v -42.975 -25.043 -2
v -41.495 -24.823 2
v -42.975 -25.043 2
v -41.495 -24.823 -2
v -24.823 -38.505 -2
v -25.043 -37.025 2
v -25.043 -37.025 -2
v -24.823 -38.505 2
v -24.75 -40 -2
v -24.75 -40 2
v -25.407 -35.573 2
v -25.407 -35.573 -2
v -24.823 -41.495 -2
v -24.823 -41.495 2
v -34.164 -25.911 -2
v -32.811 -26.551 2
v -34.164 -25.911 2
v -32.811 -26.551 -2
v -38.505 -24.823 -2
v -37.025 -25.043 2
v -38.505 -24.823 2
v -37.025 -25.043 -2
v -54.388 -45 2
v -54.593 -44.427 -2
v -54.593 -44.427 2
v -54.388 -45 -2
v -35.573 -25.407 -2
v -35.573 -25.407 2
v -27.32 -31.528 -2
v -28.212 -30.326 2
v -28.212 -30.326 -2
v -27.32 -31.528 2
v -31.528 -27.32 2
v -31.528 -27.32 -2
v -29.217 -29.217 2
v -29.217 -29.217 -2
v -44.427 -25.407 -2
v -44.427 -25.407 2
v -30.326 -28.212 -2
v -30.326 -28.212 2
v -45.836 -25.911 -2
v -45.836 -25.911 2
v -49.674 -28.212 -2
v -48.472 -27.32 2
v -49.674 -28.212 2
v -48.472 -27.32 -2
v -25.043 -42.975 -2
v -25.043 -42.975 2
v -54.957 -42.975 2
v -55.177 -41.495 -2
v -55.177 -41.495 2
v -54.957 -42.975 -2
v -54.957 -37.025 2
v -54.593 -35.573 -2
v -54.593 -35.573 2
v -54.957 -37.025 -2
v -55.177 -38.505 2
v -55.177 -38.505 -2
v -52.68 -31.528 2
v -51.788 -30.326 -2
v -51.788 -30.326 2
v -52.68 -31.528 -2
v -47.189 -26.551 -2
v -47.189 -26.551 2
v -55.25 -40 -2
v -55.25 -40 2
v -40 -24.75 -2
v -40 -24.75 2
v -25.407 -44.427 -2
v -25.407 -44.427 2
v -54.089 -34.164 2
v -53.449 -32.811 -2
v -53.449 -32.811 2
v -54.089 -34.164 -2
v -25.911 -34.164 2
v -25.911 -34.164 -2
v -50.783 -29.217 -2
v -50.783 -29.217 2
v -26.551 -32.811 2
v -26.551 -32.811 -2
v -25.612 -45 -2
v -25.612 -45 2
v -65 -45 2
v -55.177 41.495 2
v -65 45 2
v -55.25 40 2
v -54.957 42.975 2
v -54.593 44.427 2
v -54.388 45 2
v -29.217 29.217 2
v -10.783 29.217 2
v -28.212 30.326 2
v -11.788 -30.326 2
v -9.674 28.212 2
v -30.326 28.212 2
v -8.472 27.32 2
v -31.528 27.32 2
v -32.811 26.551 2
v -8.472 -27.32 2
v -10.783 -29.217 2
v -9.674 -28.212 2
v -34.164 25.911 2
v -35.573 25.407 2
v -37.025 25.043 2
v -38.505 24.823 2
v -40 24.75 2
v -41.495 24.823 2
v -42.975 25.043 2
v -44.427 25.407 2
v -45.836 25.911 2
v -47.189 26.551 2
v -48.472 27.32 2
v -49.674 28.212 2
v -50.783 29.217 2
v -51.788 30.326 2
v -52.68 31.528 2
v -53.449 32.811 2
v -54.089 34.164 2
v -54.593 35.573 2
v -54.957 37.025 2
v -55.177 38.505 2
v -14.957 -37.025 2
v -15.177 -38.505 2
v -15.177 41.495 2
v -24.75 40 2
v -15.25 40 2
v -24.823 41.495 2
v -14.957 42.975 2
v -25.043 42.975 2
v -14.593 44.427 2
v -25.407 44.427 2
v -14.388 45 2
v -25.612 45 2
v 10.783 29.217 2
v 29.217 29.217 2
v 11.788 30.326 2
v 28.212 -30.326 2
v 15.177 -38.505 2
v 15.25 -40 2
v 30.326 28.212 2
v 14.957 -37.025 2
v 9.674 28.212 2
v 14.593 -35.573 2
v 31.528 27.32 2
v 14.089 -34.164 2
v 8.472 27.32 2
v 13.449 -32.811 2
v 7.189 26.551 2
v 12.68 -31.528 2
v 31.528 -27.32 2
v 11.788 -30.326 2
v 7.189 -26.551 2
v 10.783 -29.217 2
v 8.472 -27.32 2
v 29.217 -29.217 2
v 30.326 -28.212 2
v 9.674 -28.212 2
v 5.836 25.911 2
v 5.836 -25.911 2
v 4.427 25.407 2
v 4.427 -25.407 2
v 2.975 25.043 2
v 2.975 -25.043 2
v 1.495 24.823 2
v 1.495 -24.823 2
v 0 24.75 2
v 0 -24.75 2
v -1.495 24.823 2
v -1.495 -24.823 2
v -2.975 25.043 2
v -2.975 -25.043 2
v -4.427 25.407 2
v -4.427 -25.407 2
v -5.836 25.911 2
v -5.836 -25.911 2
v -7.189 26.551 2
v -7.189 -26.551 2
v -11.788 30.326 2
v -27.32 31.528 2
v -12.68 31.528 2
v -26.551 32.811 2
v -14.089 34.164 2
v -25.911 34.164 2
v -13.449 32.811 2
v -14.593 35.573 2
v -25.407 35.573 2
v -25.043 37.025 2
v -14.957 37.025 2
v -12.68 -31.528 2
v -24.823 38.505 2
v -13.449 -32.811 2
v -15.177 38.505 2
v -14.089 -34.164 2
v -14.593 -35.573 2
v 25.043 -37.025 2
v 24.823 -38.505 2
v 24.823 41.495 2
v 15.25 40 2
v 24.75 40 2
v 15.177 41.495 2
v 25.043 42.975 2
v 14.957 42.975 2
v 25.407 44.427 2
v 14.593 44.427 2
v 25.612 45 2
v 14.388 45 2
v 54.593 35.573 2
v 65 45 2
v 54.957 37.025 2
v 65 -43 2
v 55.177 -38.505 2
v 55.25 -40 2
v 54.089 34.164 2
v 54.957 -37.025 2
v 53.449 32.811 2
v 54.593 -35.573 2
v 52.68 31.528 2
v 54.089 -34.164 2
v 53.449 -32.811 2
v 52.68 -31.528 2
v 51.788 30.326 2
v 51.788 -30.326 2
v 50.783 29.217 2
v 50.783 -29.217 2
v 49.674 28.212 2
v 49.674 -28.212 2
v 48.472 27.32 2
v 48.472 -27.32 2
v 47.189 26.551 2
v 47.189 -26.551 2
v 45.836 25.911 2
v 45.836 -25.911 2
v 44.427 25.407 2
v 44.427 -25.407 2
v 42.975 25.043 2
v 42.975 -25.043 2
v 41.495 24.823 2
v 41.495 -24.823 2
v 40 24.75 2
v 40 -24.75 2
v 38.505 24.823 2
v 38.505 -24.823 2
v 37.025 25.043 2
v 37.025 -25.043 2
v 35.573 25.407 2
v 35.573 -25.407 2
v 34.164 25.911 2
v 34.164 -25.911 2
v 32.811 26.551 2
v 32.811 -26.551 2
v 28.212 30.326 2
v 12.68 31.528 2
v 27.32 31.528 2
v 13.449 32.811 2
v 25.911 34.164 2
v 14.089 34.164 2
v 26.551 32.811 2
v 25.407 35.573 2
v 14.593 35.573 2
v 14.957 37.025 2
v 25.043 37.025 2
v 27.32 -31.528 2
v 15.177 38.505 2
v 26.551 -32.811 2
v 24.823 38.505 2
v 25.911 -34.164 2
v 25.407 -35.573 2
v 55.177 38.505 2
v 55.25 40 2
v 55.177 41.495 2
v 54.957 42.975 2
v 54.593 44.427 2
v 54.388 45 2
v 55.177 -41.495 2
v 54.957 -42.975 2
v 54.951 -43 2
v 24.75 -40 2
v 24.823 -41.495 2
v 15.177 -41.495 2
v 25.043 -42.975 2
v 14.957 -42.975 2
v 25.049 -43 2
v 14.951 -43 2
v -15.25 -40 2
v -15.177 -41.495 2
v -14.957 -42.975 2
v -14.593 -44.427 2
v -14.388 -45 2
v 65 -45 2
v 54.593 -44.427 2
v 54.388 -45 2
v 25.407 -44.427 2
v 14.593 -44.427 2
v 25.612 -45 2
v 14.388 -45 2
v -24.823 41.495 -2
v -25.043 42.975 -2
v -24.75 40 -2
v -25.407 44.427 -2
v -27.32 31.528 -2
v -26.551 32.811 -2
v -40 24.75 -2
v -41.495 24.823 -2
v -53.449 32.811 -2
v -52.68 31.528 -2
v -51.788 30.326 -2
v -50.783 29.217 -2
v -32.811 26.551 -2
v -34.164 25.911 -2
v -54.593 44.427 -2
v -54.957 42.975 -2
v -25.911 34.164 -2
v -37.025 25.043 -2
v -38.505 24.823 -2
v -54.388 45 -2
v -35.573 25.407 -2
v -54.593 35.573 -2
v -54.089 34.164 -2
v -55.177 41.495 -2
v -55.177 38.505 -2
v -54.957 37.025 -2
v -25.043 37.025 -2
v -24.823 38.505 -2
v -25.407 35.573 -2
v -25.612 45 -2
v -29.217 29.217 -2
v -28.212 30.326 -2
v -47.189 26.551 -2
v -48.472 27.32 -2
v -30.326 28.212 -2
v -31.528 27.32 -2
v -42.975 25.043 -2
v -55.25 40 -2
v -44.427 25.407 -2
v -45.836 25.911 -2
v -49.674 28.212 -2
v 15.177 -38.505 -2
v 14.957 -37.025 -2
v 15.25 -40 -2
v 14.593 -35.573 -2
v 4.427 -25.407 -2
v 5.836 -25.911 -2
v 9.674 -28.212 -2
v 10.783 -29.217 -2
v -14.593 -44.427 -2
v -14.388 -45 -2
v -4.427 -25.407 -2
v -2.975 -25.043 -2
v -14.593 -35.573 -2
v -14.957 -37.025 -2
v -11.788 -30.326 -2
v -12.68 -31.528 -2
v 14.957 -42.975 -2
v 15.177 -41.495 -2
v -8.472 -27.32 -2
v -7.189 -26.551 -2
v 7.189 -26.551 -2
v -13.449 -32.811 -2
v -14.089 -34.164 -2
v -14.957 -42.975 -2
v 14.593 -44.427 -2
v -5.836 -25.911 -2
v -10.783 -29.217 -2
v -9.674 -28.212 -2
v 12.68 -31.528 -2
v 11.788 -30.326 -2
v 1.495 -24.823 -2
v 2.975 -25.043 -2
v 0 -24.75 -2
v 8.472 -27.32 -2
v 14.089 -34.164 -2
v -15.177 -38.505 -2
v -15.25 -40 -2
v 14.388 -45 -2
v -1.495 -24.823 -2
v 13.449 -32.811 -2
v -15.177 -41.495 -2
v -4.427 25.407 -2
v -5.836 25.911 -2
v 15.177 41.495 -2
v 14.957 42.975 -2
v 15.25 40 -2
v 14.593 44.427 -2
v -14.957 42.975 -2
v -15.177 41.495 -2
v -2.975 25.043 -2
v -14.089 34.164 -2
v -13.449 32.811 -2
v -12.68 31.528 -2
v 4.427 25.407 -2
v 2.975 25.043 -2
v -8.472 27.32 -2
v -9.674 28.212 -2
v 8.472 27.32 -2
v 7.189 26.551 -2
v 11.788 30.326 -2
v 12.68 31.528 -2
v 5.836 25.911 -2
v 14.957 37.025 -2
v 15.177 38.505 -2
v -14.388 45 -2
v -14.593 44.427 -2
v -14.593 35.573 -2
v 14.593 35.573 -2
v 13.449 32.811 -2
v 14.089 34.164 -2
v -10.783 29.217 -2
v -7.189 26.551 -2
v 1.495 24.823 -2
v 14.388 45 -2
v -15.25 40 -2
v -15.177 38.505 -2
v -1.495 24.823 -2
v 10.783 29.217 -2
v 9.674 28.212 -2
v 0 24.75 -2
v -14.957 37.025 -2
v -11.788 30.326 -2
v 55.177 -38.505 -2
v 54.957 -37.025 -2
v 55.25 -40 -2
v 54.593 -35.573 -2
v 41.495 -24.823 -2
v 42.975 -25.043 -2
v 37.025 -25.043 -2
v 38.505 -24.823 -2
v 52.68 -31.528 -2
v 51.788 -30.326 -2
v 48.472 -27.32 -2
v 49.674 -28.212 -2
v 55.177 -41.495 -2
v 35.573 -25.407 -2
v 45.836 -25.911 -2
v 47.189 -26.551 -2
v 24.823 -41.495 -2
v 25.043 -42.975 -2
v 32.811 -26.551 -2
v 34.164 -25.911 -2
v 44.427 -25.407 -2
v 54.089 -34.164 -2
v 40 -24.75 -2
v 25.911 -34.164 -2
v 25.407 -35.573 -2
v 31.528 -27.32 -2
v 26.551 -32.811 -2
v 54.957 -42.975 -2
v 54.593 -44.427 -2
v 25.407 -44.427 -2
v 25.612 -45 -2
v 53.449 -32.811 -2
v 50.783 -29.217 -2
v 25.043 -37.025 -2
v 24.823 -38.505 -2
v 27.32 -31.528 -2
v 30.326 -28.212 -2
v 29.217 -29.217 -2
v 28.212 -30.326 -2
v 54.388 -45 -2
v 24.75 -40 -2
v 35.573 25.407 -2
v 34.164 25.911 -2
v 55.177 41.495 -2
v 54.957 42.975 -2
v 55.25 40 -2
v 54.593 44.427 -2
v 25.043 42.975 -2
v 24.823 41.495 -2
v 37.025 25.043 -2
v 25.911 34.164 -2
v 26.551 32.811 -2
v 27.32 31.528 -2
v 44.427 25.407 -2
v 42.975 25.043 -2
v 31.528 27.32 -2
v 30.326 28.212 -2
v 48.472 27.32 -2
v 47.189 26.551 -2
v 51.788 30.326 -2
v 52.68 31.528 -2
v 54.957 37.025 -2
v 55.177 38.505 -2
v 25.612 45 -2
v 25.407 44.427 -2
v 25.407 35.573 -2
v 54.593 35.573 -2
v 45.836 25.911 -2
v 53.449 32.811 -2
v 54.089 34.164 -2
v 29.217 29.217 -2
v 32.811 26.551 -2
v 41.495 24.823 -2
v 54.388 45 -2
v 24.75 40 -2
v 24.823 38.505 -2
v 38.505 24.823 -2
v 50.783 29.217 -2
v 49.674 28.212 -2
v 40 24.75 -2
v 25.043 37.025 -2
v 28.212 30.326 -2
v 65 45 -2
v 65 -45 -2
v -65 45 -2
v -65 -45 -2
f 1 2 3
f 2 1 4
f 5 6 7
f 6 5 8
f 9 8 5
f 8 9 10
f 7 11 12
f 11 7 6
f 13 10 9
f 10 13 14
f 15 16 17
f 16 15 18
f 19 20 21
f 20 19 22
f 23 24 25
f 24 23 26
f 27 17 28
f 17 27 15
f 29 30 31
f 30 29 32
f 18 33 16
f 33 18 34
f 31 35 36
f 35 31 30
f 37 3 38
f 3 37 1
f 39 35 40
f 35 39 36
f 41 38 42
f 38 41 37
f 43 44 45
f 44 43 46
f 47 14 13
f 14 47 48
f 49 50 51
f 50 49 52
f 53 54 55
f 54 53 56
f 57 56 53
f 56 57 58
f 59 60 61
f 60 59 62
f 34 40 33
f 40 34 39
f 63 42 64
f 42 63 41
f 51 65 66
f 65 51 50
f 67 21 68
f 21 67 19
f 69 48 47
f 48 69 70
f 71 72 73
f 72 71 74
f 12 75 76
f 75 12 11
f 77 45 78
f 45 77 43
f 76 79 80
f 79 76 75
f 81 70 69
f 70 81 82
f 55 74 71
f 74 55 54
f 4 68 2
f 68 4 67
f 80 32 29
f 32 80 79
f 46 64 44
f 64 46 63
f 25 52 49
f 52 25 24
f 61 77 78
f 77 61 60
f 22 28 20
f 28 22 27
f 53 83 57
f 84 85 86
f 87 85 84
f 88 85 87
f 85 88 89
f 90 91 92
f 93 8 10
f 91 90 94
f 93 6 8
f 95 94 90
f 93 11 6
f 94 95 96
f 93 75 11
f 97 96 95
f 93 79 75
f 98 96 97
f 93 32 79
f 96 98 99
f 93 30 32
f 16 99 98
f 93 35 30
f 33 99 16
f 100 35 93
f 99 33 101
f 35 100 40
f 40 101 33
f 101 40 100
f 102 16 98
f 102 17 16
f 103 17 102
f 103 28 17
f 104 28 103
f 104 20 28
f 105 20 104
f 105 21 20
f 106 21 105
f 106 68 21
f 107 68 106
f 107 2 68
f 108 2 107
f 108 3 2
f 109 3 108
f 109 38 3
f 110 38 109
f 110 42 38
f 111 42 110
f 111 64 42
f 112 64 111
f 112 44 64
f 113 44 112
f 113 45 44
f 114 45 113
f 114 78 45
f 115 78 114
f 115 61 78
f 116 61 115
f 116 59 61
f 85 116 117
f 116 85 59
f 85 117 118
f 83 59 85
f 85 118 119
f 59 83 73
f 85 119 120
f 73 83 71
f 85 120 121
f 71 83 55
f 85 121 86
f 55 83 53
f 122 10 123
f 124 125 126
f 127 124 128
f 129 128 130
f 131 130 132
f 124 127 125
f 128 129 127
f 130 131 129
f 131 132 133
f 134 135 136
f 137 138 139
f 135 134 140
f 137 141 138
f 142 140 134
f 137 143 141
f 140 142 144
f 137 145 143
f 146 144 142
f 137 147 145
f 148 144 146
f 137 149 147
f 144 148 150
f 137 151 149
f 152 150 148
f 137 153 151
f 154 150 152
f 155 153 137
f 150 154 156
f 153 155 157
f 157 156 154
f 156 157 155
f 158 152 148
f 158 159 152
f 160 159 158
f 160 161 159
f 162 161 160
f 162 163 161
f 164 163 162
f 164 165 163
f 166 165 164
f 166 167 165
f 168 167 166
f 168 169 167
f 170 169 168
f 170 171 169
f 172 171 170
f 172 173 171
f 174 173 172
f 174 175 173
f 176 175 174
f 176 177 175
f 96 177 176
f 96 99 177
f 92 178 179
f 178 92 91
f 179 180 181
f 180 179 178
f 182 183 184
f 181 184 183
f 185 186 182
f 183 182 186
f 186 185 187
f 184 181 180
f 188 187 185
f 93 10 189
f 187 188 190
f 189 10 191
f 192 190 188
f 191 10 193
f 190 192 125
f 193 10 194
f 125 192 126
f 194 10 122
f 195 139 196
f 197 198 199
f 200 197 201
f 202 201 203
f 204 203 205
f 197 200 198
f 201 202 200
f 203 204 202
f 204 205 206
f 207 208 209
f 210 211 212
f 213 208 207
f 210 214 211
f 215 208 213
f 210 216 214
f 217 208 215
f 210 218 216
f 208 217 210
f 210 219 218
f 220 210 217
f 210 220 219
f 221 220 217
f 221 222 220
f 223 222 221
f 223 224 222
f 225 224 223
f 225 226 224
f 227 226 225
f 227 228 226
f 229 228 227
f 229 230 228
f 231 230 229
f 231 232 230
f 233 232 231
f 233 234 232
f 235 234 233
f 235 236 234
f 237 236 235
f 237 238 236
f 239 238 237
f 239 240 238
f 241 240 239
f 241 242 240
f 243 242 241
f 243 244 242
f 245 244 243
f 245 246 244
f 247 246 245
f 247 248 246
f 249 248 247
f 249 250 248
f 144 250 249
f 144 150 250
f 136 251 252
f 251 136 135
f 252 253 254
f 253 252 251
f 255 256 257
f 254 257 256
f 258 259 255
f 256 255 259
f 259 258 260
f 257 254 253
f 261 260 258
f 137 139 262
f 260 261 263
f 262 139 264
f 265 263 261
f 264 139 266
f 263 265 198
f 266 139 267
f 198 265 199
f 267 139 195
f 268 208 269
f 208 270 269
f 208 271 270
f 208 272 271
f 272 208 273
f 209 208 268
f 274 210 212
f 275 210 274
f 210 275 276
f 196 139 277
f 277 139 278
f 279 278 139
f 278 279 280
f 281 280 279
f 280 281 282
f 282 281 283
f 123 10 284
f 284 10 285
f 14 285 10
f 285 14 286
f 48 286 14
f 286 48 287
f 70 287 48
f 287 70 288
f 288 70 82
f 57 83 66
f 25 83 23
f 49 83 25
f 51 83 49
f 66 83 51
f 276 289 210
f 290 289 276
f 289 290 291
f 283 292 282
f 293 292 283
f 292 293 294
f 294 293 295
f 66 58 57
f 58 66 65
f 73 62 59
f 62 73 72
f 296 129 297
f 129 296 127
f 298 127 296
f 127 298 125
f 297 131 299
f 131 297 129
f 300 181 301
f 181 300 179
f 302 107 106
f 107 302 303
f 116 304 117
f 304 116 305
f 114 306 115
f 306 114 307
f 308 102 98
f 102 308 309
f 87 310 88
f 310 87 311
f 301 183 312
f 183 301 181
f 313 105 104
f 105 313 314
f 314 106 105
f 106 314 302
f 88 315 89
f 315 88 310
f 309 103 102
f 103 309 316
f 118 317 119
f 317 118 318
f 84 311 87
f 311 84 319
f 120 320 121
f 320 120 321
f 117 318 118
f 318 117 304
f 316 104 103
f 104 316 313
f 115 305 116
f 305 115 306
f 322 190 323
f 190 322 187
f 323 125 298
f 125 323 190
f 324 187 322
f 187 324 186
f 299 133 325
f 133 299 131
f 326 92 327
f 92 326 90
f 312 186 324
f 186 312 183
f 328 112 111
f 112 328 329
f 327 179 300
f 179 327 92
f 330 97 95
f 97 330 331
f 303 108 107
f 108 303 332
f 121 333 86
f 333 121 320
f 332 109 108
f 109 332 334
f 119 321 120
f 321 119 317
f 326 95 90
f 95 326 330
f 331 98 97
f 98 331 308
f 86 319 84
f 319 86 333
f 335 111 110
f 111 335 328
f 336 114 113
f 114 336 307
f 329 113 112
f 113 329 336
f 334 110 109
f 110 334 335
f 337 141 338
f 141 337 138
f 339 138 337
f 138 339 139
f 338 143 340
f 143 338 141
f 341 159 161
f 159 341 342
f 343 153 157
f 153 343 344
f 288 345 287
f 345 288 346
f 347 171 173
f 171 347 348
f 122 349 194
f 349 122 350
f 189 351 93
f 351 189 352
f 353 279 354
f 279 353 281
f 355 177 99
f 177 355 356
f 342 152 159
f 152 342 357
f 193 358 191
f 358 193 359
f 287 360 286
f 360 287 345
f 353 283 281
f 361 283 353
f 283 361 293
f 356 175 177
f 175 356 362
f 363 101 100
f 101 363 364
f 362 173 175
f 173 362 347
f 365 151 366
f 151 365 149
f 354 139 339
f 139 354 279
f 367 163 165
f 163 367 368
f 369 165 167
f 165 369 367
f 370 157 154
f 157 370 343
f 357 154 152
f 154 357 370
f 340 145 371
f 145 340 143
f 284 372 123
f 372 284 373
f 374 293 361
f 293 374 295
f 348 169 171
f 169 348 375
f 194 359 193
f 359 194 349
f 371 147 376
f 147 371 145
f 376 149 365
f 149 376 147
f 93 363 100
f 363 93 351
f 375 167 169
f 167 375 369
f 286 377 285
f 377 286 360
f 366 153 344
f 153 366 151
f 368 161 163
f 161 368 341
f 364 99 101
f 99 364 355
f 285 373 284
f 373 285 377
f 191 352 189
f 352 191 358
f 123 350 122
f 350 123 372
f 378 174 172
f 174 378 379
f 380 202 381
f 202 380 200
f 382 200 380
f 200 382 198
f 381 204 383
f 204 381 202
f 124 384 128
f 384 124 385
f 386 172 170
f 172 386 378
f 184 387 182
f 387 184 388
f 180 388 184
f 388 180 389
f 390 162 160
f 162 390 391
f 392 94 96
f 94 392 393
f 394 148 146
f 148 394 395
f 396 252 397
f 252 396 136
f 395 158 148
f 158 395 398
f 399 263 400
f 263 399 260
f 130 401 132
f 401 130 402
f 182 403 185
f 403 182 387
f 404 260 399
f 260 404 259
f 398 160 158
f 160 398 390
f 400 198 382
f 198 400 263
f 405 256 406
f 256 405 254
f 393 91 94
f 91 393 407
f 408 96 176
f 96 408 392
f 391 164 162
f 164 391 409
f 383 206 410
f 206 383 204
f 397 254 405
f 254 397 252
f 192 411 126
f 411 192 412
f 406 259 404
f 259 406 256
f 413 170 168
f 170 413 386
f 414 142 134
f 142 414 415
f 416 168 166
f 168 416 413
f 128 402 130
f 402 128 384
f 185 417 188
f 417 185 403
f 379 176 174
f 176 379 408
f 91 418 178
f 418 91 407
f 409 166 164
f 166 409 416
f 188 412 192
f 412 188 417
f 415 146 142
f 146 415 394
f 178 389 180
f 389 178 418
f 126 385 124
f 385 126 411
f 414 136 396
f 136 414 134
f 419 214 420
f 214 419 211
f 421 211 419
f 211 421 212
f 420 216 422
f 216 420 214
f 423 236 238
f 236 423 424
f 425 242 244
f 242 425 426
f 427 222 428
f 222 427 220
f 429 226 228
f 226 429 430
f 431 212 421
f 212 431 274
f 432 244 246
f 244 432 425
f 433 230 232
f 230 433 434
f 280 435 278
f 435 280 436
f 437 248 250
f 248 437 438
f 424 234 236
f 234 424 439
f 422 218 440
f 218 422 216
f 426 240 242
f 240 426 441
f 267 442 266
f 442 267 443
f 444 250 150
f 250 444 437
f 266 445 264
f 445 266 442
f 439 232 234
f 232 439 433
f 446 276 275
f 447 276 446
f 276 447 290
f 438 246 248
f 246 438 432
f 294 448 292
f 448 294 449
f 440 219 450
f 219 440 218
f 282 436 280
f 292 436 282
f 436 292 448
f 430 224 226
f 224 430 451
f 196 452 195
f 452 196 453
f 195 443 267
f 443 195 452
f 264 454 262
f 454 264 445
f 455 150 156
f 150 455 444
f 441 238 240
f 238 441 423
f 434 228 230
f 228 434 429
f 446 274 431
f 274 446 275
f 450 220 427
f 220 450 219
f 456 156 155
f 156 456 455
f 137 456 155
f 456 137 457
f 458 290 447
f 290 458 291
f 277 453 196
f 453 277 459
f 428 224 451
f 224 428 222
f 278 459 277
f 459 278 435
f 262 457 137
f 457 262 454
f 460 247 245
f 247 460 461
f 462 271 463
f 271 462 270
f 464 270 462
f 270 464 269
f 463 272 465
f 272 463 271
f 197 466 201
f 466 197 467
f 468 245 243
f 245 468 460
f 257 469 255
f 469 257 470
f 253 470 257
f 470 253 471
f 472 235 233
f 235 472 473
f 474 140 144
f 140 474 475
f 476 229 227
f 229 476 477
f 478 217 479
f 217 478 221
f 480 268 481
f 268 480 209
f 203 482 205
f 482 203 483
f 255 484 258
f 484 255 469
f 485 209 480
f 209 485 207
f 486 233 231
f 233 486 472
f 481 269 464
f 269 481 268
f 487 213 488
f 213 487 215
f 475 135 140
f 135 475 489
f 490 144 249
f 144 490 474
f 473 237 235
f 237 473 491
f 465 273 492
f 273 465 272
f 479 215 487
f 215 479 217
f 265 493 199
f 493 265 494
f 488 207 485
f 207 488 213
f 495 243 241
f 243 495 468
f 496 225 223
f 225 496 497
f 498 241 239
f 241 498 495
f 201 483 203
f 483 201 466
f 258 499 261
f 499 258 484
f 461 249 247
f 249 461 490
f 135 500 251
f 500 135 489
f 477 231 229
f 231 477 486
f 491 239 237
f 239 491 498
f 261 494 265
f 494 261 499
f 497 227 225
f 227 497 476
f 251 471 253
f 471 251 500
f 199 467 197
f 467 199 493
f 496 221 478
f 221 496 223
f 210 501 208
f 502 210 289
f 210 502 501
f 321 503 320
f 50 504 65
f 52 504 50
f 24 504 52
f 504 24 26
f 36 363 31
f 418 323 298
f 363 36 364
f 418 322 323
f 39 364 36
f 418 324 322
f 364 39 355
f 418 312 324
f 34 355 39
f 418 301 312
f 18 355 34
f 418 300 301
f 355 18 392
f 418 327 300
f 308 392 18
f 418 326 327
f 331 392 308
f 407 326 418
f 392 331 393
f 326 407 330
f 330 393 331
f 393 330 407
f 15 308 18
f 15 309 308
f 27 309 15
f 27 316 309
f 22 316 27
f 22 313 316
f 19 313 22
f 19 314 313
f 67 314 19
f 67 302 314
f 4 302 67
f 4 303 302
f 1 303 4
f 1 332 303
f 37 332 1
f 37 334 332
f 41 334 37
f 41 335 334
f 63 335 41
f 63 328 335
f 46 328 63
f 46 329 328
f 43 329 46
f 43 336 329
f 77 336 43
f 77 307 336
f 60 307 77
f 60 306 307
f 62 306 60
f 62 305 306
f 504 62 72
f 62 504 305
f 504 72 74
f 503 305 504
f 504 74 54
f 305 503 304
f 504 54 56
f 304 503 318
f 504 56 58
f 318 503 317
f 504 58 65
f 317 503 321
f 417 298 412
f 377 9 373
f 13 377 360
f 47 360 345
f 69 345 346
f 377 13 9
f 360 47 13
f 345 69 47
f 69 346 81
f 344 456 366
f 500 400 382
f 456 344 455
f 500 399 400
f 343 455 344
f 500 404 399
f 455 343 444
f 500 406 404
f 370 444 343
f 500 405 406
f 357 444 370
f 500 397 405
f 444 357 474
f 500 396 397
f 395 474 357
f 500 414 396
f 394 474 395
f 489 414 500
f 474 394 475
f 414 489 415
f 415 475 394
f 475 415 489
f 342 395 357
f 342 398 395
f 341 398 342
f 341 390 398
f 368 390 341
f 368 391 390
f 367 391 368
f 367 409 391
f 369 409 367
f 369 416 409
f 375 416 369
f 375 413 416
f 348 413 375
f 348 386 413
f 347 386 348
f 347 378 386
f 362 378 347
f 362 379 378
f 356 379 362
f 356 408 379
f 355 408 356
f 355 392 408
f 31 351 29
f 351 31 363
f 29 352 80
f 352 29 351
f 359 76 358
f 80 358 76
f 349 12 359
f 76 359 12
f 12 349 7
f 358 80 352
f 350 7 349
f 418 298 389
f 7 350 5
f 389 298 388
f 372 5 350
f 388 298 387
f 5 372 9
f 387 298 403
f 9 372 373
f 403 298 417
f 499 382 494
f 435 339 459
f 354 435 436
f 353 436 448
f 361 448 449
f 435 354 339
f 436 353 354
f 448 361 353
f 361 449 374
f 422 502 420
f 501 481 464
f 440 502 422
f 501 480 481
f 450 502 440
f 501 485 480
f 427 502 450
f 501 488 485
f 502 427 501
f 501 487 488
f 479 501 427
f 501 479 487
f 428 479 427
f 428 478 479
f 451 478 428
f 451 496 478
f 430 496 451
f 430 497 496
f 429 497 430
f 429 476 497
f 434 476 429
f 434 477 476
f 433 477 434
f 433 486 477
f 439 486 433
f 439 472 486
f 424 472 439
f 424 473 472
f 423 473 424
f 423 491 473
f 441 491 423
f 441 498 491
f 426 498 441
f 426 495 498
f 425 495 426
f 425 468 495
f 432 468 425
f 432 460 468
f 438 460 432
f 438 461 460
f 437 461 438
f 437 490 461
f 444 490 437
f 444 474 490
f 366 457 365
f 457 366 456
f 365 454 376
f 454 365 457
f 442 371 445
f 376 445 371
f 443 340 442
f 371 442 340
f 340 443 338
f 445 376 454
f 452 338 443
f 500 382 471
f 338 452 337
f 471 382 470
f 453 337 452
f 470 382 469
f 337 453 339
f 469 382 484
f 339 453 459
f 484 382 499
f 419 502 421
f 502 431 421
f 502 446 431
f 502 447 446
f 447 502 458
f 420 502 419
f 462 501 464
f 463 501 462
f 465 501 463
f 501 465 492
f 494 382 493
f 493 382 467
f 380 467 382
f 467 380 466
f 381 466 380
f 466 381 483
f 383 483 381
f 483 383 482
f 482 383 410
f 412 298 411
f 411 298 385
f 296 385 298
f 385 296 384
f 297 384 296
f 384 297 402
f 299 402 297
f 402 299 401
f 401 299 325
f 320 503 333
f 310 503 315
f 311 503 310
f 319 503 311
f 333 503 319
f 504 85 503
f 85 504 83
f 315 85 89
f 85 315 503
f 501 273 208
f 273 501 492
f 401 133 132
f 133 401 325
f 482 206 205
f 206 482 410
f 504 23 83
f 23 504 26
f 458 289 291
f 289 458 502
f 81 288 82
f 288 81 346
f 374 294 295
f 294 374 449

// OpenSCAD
// Dimensions (mm)
plate_x = 130;
plate_y = 90;
plate_z = 4;

hole_diameter = 30.5;
hole_radius = hole_diameter / 2;

// Grid layout: 2 rows (Y) x 3 columns (X)
// 40 mm center-to-center spacing
grid_spacing_x = 40;
grid_spacing_y = 40;

// Wall dimensions
wall_length = plate_x;
wall_thickness = 4;
wall_height = 70;

// Quality
$fn = 64;

// Main structure
difference() {
    // Base plate
    translate([0, 0, 0])
        cube([plate_x, plate_y, plate_z], center = true);

    // Side walls (long edges along X)
    // Left wall (at y = -plate_y/2)
    translate([0, -plate_y/2 - wall_thickness/2, plate_z/2])
        cube([wall_length, wall_thickness, wall_height]);

    // Right wall (at y = +plate_y/2)
    translate([0, plate_y/2 + wall_thickness/2, plate_z/2])
        cube([wall_length, wall_thickness, wall_height]);

    // Holes: 2 rows (Y) x 3 columns (X)
    // Centers at:
    // X: -40, 0, +40
    // Y: -20, +20
    for (xi = [-1, 0, 1]) {
        for (yi = [-1, 1]) {
            translate([xi * grid_spacing_x, yi * grid_spacing_y, -1])
                cylinder(r = hole_radius, h = plate_z + 2, center = true);
        }
    }
}
